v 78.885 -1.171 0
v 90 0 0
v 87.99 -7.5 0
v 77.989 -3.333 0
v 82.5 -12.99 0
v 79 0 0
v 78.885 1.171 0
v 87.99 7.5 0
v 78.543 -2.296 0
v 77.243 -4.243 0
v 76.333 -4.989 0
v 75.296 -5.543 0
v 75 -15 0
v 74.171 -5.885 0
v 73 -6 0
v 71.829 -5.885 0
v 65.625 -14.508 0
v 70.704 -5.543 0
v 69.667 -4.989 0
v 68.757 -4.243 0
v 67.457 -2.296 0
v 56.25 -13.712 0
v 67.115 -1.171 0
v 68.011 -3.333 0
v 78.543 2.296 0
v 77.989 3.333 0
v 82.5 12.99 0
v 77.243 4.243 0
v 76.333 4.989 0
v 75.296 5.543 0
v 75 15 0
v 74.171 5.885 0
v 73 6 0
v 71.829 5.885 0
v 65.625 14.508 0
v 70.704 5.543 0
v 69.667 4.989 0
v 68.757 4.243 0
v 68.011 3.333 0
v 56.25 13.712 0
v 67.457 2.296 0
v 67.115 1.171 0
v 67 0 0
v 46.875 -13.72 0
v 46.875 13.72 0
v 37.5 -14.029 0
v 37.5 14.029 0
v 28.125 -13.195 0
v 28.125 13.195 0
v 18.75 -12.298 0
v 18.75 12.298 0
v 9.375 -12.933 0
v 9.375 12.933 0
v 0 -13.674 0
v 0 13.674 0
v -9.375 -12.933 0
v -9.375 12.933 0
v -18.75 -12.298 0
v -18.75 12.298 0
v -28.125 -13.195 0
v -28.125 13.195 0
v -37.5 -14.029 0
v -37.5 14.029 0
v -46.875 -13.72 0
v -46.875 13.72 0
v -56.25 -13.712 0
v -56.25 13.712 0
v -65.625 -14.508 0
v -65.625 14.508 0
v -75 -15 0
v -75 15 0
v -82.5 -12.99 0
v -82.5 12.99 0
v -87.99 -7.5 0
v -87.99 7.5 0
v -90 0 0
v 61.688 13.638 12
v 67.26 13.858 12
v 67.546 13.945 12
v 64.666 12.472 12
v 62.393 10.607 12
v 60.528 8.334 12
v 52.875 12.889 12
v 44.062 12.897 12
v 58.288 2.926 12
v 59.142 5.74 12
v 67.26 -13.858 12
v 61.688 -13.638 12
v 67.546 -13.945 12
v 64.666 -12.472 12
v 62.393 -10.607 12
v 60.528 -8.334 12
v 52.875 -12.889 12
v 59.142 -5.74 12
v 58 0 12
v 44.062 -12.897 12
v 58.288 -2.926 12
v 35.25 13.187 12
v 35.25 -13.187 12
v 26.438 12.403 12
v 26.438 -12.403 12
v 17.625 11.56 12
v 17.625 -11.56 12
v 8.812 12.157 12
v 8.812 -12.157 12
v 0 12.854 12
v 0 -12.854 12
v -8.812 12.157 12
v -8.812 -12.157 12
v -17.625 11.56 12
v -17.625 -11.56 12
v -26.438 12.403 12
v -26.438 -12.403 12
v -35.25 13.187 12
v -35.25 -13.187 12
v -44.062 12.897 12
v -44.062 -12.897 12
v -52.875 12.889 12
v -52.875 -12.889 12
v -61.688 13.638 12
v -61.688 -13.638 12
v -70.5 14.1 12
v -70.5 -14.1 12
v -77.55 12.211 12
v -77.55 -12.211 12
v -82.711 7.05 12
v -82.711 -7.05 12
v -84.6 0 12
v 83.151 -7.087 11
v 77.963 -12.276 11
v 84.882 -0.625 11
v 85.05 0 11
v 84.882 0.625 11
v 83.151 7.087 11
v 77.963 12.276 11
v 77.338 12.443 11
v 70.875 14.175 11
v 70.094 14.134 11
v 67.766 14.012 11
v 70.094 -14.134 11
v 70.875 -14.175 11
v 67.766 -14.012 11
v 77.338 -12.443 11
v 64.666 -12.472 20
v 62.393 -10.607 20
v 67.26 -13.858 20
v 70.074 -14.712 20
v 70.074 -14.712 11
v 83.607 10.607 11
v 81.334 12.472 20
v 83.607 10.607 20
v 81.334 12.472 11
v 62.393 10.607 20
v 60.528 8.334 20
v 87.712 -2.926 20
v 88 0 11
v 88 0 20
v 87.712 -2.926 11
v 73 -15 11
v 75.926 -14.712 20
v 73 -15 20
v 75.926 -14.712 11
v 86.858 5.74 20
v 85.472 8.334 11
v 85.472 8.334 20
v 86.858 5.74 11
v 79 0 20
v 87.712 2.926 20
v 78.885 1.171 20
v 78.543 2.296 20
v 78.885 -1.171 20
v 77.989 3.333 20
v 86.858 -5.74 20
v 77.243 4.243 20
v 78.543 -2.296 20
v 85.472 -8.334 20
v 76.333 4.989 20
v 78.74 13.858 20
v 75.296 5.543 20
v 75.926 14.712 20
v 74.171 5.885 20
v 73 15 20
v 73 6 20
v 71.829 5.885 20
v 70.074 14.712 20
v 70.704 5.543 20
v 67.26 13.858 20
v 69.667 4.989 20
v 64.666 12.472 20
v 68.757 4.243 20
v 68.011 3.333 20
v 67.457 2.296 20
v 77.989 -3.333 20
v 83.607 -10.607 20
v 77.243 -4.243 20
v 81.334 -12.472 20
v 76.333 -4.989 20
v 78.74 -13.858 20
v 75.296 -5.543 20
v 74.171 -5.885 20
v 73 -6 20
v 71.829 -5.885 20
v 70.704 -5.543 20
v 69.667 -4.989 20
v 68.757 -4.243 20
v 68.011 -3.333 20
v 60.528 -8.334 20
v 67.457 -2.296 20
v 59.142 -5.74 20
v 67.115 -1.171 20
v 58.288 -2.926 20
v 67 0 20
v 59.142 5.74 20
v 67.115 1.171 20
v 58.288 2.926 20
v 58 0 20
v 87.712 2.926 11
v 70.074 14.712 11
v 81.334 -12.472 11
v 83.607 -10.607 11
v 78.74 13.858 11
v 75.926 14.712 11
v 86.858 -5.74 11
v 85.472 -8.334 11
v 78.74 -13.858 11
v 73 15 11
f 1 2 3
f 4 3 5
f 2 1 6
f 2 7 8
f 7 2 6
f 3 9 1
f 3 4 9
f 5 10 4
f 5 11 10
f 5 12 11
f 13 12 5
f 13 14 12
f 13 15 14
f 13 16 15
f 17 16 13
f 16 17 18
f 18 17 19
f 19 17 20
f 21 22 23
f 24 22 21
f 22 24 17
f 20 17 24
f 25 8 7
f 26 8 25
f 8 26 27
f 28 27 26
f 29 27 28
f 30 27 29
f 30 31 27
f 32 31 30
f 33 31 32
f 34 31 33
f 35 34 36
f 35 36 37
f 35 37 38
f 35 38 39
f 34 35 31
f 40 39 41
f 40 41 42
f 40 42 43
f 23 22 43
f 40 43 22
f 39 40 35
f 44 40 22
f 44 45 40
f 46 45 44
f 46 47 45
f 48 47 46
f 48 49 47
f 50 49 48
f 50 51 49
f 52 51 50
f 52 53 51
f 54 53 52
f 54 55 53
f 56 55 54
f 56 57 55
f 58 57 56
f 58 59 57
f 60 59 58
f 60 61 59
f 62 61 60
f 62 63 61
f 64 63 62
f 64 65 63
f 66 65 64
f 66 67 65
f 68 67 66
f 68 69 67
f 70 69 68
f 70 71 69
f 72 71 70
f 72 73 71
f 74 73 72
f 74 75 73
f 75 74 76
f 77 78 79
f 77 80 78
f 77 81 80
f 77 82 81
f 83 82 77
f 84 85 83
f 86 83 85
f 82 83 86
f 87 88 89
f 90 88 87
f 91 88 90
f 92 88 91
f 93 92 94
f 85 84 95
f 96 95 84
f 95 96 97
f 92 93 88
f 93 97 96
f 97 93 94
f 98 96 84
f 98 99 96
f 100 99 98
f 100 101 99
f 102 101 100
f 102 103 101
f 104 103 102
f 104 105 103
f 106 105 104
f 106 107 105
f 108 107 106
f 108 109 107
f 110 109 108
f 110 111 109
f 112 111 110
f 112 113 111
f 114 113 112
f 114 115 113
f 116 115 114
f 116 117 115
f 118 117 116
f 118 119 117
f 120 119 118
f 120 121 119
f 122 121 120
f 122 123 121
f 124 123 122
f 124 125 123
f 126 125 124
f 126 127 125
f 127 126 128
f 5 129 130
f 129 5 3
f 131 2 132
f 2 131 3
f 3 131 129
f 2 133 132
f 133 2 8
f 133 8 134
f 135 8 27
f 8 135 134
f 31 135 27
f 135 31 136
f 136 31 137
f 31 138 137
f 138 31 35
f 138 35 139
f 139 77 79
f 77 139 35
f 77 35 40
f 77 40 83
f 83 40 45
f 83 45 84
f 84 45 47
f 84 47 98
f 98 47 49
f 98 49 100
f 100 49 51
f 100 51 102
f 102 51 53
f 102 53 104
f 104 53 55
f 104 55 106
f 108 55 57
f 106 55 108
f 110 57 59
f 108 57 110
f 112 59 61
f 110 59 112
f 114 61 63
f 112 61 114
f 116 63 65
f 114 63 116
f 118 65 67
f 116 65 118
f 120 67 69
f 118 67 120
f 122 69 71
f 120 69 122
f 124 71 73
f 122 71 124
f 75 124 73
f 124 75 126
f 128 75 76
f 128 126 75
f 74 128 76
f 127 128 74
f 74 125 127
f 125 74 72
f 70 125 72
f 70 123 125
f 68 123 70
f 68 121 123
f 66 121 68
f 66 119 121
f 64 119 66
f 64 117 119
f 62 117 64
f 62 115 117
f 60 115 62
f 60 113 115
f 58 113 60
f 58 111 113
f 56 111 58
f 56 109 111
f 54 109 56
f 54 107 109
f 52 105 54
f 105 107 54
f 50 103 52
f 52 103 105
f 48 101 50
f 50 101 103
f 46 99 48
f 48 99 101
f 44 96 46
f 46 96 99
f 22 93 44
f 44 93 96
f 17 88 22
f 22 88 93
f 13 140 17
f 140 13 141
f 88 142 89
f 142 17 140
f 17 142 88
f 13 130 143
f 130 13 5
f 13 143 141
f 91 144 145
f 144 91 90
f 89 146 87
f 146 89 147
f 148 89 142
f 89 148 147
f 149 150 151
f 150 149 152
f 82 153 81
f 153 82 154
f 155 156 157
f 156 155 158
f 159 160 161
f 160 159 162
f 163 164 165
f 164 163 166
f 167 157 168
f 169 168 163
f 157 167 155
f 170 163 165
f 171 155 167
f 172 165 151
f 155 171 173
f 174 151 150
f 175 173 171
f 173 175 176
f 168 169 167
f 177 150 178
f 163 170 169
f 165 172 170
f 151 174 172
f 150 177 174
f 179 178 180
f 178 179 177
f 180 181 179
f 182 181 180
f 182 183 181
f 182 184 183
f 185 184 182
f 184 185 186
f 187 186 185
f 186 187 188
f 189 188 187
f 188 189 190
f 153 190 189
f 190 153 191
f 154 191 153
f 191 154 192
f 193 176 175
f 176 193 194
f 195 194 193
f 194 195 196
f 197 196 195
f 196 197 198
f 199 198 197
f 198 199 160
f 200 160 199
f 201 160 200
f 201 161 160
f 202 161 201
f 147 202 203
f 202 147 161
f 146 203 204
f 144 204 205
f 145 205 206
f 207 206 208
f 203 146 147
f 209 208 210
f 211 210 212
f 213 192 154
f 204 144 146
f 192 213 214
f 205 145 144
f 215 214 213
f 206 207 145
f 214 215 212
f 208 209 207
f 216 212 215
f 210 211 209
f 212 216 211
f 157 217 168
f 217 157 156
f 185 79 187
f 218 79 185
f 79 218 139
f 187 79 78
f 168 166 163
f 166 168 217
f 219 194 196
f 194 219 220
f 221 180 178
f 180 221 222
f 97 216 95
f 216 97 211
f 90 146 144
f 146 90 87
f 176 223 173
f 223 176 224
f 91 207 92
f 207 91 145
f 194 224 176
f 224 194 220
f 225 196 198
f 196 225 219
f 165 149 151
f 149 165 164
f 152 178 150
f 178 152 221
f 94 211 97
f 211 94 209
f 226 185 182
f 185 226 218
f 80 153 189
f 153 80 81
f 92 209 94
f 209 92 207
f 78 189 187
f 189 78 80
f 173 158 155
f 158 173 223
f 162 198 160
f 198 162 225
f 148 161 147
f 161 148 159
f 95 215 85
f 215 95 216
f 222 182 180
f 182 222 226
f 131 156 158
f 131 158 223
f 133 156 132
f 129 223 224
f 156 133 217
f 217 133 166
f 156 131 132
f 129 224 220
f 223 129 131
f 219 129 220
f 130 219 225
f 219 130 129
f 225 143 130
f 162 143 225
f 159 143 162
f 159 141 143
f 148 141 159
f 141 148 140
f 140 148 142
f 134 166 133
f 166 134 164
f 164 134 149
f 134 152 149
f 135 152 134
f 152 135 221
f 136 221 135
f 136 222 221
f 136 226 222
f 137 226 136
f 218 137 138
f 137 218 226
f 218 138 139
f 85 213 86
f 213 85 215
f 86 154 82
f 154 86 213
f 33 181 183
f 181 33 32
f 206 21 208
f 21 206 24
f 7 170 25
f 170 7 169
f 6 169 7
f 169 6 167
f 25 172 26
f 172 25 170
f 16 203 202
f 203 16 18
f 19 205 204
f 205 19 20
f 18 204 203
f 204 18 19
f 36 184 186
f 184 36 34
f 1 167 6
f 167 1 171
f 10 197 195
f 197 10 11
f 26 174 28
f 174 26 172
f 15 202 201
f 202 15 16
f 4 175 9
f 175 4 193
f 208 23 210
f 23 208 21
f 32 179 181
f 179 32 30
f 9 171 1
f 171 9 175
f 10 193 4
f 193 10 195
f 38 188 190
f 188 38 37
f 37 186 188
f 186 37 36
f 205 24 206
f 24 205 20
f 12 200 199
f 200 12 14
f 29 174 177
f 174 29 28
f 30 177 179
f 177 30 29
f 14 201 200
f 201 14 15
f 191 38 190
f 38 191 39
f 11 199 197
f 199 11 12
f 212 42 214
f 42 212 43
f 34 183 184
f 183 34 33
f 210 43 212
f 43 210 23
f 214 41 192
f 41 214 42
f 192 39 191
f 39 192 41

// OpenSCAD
$fn = 32;

// ----------------------------------------------------------------------
// Handle: 180 x 30 mm grip, 12 mm thick
// ----------------------------------------------------------------------

// --- parameters (mm) ---
length = 180;             // grip length
width = 30;               // grip width
thickness = 12;           // grip thickness
waist = 0.86;             // width factor at the middle
draft = 0.94;             // top face scale of the extrusion
scallops = 4;             // finger rests per side
ripple = 0.06;            // depth factor of the finger rests
boss_d = 30;              // mounting boss diameter
boss_h = 8;               // mounting boss height
boss_hole_d = 12;         // screw clearance through the boss
boss_r = 73;              // boss centre from the grip centre

/* ergonomic grip outline, closed spline-like polygon in the XY plane */
grip = [[-75, 15], [-65.625, 14.508], [-56.25, 13.712], [-46.875, 13.72], [-37.5, 14.029], [-28.125, 13.195], [-18.75, 12.298], [-9.375, 12.933], [0, 13.674], [9.375, 12.933], [18.75, 12.298], [28.125, 13.195], [37.5, 14.029], [46.875, 13.72], [56.25, 13.712], [65.625, 14.508], [75, 15], [82.5, 12.99], [87.99, 7.5], [90, 0], [87.99, -7.5], [82.5, -12.99], [75, -15], [75, -15], [65.625, -14.508], [56.25, -13.712], [46.875, -13.72], [37.5, -14.029], [28.125, -13.195], [18.75, -12.298], [9.375, -12.933], [0, -13.674], [-9.375, -12.933], [-18.75, -12.298], [-28.125, -13.195], [-37.5, -14.029], [-46.875, -13.72], [-56.25, -13.712], [-65.625, -14.508], [-75, -15], [-82.5, -12.99], [-87.99, -7.5], [-90, 0], [-87.99, 7.5], [-82.5, 12.99], [-75, 15]];

module grip_body() {
  linear_extrude(height = thickness, scale = draft) polygon(grip);
}

module boss_body() {
  /* sunk 1 mm into the grip so the joint overlaps */
  translate([boss_r, 0, thickness - 1]) cylinder(h = boss_h + 1, d = boss_d);
}

difference() {
  union() {
    grip_body();
    boss_body();
  }
  translate([boss_r, 0, -1]) cylinder(h = thickness + boss_h + 2, d = boss_hole_d);
}
